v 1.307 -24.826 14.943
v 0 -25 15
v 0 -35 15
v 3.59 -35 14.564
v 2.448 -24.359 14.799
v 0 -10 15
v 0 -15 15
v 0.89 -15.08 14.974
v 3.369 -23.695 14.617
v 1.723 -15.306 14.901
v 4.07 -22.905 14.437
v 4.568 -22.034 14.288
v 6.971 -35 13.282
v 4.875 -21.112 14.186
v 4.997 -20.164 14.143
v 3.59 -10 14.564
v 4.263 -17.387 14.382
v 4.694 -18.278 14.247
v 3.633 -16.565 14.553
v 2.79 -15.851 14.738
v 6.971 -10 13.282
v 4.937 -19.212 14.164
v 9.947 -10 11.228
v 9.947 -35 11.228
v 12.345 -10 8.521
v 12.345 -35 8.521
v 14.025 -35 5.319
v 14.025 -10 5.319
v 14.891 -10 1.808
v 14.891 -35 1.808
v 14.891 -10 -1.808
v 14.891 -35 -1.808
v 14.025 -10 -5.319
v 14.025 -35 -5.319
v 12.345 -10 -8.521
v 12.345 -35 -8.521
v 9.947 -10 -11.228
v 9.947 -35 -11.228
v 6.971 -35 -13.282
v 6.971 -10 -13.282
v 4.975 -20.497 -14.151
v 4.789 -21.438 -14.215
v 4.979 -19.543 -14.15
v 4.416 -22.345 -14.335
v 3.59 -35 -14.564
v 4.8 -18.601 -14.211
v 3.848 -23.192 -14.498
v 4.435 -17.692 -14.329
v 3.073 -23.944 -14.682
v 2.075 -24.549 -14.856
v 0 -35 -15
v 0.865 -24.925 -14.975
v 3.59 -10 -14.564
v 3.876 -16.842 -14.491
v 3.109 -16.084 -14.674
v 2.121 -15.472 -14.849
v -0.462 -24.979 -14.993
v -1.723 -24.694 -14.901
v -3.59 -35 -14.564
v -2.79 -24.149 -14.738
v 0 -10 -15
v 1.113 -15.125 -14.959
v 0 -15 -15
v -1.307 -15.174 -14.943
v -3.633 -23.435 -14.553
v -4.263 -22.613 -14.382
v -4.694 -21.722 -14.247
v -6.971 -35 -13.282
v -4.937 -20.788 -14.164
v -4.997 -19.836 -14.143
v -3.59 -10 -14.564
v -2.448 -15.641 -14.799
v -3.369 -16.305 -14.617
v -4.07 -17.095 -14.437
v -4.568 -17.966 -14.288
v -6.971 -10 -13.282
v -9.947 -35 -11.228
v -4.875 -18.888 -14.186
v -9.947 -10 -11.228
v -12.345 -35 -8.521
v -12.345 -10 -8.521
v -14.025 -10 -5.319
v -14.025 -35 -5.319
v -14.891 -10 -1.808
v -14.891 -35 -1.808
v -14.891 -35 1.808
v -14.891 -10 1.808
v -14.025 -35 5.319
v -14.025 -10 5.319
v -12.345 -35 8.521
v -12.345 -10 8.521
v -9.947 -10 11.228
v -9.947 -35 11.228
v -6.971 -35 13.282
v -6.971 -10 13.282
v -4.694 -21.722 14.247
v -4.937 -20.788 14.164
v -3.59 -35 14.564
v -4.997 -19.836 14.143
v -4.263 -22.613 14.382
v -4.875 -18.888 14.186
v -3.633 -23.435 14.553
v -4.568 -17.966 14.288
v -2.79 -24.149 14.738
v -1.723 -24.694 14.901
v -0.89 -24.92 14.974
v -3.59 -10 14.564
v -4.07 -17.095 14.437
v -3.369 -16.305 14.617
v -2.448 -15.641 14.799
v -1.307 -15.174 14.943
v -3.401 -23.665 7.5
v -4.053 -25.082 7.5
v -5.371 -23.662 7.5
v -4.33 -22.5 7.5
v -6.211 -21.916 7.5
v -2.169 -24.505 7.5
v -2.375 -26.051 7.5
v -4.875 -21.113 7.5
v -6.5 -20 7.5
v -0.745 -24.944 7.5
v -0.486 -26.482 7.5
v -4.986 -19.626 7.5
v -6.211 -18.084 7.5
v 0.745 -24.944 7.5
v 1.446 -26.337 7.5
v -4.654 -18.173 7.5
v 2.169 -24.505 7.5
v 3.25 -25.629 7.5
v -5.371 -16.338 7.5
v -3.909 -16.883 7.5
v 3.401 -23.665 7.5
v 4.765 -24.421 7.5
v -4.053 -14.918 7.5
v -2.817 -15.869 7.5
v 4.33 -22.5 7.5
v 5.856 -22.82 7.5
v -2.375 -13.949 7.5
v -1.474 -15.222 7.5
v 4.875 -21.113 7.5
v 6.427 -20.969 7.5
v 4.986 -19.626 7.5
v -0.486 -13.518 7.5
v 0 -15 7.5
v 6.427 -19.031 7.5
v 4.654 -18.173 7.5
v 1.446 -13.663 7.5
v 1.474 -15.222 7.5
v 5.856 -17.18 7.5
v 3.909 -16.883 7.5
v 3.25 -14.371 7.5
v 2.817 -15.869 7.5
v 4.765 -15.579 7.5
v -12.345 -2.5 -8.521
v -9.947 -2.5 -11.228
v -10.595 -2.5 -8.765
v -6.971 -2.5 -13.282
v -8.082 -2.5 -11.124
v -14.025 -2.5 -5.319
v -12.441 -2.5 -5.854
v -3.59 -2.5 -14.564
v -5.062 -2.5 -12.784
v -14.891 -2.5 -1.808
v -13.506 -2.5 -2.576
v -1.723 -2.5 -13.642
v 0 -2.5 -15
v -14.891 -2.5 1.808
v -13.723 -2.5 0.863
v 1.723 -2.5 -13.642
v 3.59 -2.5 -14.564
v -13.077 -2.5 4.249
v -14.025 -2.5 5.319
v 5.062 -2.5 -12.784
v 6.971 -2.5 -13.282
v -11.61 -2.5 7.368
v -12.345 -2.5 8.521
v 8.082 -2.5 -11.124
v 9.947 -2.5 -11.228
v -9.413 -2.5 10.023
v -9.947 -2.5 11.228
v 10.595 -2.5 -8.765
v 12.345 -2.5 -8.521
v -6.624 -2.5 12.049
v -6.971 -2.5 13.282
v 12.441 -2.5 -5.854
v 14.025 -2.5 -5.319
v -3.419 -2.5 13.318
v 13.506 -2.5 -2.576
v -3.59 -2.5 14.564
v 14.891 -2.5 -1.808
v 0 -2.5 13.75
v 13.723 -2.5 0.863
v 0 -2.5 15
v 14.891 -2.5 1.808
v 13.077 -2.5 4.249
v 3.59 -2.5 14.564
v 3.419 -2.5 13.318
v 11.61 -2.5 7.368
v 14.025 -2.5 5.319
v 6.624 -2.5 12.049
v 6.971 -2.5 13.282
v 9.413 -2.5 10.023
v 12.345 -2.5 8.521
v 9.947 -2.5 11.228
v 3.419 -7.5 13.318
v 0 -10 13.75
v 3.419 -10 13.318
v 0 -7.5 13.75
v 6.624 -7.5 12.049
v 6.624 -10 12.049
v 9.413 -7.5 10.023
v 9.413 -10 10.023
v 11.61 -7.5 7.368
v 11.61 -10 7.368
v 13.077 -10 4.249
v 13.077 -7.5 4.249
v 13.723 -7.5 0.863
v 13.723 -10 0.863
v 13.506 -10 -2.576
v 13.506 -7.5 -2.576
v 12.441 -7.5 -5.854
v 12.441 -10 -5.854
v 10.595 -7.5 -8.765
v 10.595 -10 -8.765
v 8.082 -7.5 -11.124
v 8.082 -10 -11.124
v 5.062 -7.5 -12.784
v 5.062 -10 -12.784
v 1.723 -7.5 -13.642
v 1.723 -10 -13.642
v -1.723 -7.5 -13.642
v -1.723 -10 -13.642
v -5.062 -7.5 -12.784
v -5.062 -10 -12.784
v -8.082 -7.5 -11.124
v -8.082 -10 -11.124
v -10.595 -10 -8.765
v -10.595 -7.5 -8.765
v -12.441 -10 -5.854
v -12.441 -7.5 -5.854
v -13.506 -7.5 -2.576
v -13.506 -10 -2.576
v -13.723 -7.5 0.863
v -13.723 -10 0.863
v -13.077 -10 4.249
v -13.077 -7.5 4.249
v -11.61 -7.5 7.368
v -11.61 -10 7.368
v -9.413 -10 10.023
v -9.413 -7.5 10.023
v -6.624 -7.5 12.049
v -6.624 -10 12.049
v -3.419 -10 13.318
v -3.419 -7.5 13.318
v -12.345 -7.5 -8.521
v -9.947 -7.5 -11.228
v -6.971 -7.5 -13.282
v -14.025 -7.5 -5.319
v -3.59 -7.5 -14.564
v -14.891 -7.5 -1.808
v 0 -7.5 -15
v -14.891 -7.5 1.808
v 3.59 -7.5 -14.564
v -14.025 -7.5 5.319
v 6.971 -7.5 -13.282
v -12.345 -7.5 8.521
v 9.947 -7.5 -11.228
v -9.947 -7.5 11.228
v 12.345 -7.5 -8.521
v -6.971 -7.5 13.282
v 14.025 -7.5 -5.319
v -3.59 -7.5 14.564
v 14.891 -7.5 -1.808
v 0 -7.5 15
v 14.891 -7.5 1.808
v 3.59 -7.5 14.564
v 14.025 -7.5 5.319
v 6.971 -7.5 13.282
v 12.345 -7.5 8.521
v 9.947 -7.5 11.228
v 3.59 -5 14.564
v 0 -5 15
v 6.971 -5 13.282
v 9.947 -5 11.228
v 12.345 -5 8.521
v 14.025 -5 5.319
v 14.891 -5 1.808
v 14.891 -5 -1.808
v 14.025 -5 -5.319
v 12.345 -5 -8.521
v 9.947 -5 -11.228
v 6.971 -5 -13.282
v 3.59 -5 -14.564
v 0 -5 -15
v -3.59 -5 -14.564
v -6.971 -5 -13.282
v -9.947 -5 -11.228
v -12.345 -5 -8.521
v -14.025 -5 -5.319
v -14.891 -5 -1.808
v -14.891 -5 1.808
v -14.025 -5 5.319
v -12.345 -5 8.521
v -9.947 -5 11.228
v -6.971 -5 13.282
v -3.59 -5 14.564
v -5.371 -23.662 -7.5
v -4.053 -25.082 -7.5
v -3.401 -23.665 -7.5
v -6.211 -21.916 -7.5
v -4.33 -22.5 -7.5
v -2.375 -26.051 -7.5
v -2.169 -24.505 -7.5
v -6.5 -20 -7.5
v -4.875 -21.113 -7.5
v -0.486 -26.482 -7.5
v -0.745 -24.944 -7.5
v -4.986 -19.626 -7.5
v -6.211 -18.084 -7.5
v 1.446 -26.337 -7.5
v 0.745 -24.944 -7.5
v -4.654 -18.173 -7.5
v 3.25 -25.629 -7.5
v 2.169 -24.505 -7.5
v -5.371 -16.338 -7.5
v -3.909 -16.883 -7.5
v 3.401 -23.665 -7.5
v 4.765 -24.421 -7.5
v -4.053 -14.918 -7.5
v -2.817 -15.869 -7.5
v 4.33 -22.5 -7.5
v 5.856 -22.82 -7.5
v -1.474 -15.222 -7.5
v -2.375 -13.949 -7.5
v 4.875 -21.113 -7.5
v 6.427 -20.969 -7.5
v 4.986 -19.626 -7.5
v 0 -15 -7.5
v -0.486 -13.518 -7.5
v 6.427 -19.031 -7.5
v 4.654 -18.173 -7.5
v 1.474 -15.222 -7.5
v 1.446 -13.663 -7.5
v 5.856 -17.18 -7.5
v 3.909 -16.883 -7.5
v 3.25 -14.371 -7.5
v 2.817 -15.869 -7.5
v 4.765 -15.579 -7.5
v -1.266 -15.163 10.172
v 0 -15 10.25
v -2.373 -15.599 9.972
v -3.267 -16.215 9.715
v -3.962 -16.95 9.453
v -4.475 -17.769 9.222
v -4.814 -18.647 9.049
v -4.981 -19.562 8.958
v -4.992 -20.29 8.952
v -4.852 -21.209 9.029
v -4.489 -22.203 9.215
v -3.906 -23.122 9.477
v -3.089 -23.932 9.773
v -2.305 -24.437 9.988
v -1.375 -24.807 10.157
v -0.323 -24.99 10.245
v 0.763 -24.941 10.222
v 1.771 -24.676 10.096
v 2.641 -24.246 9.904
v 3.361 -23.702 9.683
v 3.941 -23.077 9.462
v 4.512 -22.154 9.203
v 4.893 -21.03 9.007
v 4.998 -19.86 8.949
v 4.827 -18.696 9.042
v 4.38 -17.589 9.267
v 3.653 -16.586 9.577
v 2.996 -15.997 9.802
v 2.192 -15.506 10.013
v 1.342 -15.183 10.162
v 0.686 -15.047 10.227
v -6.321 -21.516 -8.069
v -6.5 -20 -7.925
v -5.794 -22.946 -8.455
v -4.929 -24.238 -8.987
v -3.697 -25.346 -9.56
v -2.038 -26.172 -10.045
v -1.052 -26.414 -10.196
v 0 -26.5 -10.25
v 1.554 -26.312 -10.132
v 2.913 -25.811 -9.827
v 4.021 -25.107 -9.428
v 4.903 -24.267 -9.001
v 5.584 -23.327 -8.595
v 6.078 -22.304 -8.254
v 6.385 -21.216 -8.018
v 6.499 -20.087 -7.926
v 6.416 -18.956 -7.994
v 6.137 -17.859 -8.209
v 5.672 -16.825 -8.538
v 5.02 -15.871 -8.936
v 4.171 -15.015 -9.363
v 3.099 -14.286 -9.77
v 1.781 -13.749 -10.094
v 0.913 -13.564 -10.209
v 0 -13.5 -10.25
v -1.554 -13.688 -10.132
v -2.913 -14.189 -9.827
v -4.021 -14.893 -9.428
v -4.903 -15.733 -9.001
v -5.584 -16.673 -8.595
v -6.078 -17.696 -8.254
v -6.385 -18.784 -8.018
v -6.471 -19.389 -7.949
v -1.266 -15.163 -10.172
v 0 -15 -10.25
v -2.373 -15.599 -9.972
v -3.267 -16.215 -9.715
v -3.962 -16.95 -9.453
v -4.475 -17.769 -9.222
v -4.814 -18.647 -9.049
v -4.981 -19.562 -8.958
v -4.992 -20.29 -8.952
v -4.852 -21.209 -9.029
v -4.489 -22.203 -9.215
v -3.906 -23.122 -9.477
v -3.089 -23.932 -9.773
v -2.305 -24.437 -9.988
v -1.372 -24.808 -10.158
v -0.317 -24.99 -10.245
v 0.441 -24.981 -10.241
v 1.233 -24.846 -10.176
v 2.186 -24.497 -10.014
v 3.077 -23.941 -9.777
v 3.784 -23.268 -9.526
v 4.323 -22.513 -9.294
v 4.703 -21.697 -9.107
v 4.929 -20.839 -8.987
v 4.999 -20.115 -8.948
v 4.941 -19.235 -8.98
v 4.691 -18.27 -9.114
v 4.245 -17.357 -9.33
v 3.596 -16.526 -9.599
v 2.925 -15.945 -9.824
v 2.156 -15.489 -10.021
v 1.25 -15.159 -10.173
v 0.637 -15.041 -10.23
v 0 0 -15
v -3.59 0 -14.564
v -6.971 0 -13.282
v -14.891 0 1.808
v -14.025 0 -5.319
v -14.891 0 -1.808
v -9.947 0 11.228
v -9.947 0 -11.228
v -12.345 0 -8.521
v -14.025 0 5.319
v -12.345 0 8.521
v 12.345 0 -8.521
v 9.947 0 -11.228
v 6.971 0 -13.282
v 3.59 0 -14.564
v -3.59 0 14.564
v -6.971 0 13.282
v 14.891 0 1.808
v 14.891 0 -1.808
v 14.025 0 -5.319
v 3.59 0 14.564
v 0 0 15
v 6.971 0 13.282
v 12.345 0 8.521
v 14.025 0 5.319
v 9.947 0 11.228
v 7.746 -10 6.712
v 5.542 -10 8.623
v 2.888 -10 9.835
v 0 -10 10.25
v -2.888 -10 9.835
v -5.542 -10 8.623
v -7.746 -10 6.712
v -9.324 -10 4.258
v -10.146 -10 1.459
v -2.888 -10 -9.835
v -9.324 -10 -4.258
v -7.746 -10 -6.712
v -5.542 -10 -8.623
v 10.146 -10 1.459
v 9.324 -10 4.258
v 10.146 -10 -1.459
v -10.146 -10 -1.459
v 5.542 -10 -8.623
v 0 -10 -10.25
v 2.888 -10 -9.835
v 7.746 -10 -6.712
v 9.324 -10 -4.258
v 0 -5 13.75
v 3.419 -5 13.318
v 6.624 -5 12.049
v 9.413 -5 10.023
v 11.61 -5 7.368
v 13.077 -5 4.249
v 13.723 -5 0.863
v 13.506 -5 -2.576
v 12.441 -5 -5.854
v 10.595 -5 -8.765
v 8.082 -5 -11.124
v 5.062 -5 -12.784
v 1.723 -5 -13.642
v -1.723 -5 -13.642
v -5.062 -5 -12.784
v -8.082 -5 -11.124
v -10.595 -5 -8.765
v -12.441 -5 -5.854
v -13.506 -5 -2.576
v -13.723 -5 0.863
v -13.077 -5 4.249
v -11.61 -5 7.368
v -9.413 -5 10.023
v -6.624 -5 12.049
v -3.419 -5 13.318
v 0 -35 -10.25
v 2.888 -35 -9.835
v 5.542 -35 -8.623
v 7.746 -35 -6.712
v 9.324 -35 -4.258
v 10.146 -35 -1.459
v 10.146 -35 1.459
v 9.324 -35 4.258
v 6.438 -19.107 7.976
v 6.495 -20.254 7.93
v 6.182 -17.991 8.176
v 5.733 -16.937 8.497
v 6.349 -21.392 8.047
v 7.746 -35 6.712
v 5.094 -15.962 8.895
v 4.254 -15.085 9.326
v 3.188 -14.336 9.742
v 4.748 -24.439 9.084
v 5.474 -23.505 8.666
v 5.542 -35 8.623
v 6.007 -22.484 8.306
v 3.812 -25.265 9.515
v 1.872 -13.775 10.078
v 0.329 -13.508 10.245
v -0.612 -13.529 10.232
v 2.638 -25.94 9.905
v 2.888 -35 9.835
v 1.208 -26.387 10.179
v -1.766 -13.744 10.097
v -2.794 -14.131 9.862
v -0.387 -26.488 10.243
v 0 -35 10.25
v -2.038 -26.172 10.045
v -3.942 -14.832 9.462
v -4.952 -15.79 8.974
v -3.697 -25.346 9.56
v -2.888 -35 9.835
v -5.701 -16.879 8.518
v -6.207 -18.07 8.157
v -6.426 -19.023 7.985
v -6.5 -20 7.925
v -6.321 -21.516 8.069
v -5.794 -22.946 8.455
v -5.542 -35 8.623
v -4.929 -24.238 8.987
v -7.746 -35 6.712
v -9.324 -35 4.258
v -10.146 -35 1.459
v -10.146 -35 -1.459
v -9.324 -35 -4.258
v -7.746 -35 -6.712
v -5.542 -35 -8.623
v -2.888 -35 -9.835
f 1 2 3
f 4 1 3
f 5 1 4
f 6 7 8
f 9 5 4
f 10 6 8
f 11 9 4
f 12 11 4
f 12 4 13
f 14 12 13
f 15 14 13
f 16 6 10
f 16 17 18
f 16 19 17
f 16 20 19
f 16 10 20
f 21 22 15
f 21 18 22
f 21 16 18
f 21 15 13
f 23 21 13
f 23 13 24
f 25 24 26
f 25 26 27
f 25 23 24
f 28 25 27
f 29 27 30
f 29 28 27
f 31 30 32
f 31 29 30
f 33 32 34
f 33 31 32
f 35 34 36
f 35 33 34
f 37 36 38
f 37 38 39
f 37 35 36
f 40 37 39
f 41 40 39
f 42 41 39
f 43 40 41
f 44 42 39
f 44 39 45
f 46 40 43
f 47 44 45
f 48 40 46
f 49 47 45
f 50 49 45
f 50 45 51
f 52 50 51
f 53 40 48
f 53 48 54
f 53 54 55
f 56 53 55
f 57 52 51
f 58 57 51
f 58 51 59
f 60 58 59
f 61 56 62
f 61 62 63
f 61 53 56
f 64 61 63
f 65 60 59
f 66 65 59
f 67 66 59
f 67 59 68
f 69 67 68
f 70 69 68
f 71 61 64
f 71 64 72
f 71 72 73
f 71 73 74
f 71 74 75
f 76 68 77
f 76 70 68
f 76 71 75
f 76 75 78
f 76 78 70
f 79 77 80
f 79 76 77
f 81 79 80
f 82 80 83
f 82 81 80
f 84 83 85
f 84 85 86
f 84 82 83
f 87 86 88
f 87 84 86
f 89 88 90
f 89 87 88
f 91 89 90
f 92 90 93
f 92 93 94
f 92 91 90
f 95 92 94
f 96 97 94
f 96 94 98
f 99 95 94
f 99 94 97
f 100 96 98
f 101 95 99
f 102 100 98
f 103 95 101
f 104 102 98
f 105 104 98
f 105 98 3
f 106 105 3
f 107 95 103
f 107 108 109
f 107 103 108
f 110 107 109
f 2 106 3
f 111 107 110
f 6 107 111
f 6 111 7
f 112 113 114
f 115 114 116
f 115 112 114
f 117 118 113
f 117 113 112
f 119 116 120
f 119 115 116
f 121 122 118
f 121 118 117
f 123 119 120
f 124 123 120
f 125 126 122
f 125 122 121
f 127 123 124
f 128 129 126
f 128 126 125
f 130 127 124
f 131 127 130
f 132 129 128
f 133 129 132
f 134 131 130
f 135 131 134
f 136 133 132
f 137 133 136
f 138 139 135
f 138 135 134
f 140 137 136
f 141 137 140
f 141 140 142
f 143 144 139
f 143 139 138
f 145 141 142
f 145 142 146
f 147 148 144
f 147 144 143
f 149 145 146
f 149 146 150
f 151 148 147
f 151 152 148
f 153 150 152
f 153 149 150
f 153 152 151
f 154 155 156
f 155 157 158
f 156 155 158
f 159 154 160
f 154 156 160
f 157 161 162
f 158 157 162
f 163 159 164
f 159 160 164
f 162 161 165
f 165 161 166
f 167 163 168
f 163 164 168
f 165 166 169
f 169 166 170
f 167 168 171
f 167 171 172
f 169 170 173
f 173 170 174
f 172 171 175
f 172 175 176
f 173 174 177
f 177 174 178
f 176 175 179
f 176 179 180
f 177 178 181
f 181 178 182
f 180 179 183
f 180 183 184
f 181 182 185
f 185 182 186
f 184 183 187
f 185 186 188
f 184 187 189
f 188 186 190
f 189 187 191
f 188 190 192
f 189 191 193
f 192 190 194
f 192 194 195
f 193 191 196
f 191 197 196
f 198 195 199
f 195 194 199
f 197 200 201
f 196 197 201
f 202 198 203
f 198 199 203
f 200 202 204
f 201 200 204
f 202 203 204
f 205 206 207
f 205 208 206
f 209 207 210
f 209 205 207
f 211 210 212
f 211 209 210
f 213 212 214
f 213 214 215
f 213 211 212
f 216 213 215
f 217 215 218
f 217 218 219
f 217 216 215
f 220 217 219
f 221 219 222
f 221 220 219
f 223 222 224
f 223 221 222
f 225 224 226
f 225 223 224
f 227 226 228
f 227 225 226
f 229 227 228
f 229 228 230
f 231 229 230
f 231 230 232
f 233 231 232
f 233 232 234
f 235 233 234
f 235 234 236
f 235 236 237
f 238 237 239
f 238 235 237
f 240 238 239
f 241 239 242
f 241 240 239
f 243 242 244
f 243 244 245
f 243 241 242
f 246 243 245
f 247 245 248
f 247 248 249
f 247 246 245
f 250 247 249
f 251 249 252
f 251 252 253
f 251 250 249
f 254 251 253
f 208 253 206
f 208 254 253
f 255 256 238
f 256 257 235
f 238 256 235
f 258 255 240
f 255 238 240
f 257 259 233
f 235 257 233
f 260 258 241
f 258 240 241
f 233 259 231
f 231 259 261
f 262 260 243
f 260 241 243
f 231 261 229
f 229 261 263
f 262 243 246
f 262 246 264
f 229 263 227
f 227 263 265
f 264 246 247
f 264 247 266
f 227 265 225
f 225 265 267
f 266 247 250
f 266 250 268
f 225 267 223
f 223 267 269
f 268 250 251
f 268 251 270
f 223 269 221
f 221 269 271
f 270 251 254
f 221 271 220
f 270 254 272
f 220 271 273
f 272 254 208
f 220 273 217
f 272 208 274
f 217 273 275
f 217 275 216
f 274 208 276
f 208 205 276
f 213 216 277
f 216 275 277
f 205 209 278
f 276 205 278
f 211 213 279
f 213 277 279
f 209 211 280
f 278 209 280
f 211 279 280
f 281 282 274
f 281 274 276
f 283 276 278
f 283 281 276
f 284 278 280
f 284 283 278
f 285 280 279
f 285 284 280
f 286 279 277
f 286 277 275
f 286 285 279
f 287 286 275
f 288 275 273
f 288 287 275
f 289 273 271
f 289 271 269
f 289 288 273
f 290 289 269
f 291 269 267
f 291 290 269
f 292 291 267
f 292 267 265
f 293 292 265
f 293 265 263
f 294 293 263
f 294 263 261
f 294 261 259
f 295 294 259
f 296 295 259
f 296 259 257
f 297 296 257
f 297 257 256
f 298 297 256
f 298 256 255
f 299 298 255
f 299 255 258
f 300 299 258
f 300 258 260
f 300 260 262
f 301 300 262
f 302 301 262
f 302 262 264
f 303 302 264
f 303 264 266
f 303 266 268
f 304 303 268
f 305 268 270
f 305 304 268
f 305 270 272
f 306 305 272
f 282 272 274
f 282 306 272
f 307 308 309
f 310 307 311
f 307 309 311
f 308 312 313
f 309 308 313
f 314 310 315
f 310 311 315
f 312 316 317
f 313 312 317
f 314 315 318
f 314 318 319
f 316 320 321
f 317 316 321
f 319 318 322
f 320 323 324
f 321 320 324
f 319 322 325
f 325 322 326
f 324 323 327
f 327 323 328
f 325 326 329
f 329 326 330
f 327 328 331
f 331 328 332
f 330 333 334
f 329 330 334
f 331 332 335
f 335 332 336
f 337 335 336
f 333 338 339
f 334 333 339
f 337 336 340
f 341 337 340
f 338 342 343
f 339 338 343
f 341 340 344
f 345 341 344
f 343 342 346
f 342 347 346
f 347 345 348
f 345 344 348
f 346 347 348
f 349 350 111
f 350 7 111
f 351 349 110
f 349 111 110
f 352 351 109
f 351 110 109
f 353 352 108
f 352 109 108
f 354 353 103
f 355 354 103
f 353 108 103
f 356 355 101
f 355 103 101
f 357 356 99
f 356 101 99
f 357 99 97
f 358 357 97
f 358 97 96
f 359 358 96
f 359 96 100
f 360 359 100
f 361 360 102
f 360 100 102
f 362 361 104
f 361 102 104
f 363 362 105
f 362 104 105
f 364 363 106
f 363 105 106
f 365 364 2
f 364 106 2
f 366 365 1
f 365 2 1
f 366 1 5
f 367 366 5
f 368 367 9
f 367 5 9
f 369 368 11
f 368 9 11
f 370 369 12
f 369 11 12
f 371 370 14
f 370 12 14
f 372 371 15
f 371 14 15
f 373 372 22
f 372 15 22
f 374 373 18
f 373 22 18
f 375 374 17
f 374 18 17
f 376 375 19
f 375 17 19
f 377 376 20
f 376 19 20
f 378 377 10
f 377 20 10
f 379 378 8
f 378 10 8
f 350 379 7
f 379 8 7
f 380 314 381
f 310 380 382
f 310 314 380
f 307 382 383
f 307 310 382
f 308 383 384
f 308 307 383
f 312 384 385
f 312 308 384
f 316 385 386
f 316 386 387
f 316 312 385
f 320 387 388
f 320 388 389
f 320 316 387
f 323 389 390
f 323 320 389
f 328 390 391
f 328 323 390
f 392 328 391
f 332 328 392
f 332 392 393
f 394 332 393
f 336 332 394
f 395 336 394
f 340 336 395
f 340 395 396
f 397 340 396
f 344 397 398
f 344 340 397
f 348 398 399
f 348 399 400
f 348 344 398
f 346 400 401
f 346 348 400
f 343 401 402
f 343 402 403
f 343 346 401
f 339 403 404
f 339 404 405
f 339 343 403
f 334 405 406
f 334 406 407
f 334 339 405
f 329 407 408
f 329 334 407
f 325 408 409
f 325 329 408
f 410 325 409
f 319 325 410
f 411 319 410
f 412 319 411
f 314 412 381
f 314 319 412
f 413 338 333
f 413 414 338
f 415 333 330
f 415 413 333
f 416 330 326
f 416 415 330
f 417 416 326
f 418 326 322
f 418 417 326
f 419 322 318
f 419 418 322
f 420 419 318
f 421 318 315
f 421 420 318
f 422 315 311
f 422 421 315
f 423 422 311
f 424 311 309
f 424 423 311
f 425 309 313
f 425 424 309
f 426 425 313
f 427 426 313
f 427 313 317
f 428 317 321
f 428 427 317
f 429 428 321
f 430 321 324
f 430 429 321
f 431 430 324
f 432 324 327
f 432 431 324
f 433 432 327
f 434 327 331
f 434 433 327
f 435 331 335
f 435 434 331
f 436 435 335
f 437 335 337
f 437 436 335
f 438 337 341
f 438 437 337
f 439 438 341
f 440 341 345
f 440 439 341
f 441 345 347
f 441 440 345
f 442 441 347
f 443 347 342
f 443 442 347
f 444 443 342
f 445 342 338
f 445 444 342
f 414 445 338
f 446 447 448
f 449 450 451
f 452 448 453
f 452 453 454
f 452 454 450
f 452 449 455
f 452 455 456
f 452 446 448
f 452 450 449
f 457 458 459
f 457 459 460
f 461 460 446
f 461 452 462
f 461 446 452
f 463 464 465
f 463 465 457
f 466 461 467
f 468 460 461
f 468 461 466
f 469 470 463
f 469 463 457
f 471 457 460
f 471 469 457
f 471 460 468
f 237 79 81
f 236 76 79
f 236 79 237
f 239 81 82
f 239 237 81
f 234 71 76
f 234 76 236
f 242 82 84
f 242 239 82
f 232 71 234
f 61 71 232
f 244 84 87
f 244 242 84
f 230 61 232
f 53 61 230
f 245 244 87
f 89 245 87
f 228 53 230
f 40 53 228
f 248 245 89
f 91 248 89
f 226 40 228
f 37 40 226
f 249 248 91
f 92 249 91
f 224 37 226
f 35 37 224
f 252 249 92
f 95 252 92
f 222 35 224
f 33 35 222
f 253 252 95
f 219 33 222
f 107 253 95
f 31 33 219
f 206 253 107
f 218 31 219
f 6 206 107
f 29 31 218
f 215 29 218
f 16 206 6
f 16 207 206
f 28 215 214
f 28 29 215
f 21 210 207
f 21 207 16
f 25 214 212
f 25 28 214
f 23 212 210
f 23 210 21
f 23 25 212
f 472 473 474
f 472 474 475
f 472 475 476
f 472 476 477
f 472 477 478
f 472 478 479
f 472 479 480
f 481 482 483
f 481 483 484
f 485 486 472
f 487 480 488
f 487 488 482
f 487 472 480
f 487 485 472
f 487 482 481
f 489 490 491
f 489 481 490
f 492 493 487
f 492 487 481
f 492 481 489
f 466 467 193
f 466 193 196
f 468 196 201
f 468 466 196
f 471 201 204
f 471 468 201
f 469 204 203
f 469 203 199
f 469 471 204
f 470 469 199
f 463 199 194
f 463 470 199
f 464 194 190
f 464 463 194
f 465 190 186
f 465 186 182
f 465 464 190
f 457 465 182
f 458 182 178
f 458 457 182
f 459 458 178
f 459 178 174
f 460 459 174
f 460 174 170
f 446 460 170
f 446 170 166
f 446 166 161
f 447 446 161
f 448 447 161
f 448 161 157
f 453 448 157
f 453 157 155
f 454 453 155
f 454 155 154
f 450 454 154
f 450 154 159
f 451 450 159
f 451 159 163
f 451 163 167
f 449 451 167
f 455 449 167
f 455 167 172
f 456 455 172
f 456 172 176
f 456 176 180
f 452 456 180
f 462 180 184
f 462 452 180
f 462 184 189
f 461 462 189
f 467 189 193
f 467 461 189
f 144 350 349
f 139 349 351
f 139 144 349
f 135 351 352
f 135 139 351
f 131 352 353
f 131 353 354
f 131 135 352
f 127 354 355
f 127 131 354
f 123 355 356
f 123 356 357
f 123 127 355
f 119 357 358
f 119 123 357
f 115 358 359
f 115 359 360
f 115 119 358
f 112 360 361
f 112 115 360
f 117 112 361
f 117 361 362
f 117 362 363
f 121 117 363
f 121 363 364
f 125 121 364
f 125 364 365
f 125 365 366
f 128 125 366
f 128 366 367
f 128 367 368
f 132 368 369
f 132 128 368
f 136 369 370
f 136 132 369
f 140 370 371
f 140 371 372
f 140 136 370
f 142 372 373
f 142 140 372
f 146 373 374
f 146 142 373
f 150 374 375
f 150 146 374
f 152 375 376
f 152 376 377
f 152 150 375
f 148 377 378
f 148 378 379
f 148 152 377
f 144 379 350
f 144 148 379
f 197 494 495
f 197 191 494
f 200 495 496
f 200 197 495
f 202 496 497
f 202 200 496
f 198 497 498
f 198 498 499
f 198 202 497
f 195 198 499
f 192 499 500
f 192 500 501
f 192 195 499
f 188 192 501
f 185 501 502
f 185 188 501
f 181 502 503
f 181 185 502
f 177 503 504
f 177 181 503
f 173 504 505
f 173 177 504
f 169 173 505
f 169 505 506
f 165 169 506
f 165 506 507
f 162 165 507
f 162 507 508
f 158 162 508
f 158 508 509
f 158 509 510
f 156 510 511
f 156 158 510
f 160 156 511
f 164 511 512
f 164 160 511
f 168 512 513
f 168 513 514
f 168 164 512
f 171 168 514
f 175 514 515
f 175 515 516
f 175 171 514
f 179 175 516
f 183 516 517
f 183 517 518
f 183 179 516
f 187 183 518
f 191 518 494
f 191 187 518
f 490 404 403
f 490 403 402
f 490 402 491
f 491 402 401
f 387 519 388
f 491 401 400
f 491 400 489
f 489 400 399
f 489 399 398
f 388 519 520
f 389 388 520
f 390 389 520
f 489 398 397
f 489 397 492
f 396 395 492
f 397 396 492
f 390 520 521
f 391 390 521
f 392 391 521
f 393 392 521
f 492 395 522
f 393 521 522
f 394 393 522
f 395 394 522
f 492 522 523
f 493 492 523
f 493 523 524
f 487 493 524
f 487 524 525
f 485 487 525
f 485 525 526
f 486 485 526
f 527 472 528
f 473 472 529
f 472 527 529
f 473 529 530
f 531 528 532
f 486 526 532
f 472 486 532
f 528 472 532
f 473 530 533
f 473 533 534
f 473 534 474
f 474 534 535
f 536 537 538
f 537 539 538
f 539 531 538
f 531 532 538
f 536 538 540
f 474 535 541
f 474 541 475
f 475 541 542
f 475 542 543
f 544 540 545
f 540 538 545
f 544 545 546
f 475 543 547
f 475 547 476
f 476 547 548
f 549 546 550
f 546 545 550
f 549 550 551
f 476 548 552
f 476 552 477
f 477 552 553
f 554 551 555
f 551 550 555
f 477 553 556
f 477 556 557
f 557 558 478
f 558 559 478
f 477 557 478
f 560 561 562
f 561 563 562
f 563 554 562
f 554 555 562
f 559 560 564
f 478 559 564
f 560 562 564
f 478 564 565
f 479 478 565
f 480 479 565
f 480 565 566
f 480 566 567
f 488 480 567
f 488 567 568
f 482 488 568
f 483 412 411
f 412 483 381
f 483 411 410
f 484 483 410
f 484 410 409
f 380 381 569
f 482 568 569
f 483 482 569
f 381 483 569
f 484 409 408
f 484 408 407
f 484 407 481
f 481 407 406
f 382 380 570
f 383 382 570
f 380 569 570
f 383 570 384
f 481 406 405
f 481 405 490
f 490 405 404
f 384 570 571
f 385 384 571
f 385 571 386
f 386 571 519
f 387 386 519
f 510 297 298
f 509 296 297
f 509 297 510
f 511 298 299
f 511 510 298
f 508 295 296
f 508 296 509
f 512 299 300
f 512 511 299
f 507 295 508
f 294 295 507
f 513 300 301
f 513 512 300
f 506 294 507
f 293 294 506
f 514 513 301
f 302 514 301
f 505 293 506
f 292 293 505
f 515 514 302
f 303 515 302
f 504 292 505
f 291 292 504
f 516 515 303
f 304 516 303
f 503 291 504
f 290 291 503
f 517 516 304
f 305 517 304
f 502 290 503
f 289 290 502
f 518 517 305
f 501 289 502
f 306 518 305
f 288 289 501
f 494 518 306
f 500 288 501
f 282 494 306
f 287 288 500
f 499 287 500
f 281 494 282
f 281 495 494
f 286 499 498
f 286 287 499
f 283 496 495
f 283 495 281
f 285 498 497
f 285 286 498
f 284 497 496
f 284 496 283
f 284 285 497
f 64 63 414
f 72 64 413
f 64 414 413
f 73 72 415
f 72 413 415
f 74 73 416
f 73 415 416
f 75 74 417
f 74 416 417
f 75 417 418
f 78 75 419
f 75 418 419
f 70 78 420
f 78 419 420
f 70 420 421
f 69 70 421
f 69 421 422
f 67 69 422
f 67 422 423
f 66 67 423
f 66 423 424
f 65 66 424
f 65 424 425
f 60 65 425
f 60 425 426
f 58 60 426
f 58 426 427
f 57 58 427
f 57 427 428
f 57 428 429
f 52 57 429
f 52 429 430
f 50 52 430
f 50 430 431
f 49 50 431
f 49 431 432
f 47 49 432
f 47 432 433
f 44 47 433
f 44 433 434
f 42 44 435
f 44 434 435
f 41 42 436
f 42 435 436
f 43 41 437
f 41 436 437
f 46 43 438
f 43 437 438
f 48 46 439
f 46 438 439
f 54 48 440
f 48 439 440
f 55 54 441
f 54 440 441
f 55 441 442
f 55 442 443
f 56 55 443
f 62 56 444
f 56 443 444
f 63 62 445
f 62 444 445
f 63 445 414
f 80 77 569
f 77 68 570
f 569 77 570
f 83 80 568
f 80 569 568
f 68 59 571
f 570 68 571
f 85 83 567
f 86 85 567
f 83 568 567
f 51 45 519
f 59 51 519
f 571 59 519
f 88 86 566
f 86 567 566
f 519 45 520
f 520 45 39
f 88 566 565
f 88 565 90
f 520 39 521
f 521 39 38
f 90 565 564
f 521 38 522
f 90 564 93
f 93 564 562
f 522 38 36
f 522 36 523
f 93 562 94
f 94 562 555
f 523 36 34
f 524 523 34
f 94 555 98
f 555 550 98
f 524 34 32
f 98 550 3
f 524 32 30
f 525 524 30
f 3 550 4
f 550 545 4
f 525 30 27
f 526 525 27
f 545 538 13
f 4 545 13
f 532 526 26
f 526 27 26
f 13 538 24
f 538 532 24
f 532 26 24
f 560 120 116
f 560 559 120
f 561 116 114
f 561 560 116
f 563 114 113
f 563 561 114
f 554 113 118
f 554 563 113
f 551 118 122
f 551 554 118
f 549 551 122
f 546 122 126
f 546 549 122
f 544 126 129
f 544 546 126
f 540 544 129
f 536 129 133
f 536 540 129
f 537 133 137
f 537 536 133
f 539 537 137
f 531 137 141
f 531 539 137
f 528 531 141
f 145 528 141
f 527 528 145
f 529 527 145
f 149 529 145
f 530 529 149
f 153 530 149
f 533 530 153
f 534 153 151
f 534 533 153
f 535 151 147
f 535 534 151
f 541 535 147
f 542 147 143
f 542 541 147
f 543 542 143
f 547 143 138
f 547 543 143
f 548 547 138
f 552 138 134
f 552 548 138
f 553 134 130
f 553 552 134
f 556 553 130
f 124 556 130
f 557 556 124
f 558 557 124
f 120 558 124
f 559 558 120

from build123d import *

# Parameters (mm, degrees)
SKETCH1_R           = 15
BOSS_EXTRUDE1_DEPTH = 35
SKETCH2_W           = 1.25
SKETCH2_H           = 2.5
SKETCH4_R           = 5
CUT_EXTRUDE1_DEPTH  = 15
SKETCH5_R           = 10.25
CUT_EXTRUDE2_DEPTH  = 25
SKETCH6_R           = 6.5
SKETCH6_R_2         = 5
BOSS_EXTRUDE2_DEPTH = 12.5
SKETCH9_W           = 15
SKETCH9_H           = 15
CUT_EXTRUDE4_DEPTH  = 13


with BuildPart() as part:
    # Sketch1 → Boss-Extrude1 (new body)
    with BuildSketch(Plane(origin=(0, 0, 0), x_dir=(1, 0, 0), z_dir=(0, 1, 0))):
        with Locations(Location((0, 0, 0), (0, 0, 270))):
            Circle(SKETCH1_R)
    extrude(amount=-BOSS_EXTRUDE1_DEPTH)

    # Sketch2 → Cut-Revolve3 (revolve, cut)
    with BuildSketch(Plane.XY, mode=Mode.PRIVATE) as cut_revolve3_sk:
        with Locations((-14.375, -3.75)):
            Rectangle(SKETCH2_W, SKETCH2_H)
        with Locations((-14.375, -8.75)):
            Rectangle(SKETCH2_W, SKETCH2_H)
    revolve(cut_revolve3_sk.sketch.rotate(Axis((0, 0, 0), (0, 1, 0)), 90), axis=Axis((0, 0, 0), (0, 1, 0)), mode=Mode.SUBTRACT)

    # Sketch4 → Cut-Extrude1 (cut, symmetric)
    with BuildSketch(Plane.XY):
        with Locations(Location((0, -20, 0), (0, 0, 90))):
            Circle(SKETCH4_R)
    extrude(amount=CUT_EXTRUDE1_DEPTH, both=True, mode=Mode.SUBTRACT)

    # Sketch5 → Cut-Extrude2 (cut)
    with BuildSketch(Plane(origin=(0, -35, 0), x_dir=(-1, 0, 0), z_dir=(0, -1, 0))):
        with Locations(Location((0, 0, 0), (0, 0, 90))):
            Circle(SKETCH5_R)
    extrude(amount=-CUT_EXTRUDE2_DEPTH, mode=Mode.SUBTRACT)

    # Sketch6 → Boss-Extrude2 (add, symmetric)
    with BuildSketch(Plane.XY):
        with Locations(Location((0, -20, 0), (0, 0, 180))):
            Circle(SKETCH6_R)
        with Locations(Location((0, -20, 0), (0, 0, 90))):
            Circle(SKETCH6_R_2, mode=Mode.SUBTRACT)
    extrude(amount=BOSS_EXTRUDE2_DEPTH, both=True)

    # Sketch9 → Cut-Extrude4 (cut)
    with BuildSketch(Plane(origin=(6.5, 0, 0), x_dir=(0, 0, -1), z_dir=(1, 0, 0))):
        with Locations((0, -20.153875376)):
            Rectangle(SKETCH9_W, SKETCH9_H)
    extrude(amount=-CUT_EXTRUDE4_DEPTH, mode=Mode.SUBTRACT)


solid = part.part
